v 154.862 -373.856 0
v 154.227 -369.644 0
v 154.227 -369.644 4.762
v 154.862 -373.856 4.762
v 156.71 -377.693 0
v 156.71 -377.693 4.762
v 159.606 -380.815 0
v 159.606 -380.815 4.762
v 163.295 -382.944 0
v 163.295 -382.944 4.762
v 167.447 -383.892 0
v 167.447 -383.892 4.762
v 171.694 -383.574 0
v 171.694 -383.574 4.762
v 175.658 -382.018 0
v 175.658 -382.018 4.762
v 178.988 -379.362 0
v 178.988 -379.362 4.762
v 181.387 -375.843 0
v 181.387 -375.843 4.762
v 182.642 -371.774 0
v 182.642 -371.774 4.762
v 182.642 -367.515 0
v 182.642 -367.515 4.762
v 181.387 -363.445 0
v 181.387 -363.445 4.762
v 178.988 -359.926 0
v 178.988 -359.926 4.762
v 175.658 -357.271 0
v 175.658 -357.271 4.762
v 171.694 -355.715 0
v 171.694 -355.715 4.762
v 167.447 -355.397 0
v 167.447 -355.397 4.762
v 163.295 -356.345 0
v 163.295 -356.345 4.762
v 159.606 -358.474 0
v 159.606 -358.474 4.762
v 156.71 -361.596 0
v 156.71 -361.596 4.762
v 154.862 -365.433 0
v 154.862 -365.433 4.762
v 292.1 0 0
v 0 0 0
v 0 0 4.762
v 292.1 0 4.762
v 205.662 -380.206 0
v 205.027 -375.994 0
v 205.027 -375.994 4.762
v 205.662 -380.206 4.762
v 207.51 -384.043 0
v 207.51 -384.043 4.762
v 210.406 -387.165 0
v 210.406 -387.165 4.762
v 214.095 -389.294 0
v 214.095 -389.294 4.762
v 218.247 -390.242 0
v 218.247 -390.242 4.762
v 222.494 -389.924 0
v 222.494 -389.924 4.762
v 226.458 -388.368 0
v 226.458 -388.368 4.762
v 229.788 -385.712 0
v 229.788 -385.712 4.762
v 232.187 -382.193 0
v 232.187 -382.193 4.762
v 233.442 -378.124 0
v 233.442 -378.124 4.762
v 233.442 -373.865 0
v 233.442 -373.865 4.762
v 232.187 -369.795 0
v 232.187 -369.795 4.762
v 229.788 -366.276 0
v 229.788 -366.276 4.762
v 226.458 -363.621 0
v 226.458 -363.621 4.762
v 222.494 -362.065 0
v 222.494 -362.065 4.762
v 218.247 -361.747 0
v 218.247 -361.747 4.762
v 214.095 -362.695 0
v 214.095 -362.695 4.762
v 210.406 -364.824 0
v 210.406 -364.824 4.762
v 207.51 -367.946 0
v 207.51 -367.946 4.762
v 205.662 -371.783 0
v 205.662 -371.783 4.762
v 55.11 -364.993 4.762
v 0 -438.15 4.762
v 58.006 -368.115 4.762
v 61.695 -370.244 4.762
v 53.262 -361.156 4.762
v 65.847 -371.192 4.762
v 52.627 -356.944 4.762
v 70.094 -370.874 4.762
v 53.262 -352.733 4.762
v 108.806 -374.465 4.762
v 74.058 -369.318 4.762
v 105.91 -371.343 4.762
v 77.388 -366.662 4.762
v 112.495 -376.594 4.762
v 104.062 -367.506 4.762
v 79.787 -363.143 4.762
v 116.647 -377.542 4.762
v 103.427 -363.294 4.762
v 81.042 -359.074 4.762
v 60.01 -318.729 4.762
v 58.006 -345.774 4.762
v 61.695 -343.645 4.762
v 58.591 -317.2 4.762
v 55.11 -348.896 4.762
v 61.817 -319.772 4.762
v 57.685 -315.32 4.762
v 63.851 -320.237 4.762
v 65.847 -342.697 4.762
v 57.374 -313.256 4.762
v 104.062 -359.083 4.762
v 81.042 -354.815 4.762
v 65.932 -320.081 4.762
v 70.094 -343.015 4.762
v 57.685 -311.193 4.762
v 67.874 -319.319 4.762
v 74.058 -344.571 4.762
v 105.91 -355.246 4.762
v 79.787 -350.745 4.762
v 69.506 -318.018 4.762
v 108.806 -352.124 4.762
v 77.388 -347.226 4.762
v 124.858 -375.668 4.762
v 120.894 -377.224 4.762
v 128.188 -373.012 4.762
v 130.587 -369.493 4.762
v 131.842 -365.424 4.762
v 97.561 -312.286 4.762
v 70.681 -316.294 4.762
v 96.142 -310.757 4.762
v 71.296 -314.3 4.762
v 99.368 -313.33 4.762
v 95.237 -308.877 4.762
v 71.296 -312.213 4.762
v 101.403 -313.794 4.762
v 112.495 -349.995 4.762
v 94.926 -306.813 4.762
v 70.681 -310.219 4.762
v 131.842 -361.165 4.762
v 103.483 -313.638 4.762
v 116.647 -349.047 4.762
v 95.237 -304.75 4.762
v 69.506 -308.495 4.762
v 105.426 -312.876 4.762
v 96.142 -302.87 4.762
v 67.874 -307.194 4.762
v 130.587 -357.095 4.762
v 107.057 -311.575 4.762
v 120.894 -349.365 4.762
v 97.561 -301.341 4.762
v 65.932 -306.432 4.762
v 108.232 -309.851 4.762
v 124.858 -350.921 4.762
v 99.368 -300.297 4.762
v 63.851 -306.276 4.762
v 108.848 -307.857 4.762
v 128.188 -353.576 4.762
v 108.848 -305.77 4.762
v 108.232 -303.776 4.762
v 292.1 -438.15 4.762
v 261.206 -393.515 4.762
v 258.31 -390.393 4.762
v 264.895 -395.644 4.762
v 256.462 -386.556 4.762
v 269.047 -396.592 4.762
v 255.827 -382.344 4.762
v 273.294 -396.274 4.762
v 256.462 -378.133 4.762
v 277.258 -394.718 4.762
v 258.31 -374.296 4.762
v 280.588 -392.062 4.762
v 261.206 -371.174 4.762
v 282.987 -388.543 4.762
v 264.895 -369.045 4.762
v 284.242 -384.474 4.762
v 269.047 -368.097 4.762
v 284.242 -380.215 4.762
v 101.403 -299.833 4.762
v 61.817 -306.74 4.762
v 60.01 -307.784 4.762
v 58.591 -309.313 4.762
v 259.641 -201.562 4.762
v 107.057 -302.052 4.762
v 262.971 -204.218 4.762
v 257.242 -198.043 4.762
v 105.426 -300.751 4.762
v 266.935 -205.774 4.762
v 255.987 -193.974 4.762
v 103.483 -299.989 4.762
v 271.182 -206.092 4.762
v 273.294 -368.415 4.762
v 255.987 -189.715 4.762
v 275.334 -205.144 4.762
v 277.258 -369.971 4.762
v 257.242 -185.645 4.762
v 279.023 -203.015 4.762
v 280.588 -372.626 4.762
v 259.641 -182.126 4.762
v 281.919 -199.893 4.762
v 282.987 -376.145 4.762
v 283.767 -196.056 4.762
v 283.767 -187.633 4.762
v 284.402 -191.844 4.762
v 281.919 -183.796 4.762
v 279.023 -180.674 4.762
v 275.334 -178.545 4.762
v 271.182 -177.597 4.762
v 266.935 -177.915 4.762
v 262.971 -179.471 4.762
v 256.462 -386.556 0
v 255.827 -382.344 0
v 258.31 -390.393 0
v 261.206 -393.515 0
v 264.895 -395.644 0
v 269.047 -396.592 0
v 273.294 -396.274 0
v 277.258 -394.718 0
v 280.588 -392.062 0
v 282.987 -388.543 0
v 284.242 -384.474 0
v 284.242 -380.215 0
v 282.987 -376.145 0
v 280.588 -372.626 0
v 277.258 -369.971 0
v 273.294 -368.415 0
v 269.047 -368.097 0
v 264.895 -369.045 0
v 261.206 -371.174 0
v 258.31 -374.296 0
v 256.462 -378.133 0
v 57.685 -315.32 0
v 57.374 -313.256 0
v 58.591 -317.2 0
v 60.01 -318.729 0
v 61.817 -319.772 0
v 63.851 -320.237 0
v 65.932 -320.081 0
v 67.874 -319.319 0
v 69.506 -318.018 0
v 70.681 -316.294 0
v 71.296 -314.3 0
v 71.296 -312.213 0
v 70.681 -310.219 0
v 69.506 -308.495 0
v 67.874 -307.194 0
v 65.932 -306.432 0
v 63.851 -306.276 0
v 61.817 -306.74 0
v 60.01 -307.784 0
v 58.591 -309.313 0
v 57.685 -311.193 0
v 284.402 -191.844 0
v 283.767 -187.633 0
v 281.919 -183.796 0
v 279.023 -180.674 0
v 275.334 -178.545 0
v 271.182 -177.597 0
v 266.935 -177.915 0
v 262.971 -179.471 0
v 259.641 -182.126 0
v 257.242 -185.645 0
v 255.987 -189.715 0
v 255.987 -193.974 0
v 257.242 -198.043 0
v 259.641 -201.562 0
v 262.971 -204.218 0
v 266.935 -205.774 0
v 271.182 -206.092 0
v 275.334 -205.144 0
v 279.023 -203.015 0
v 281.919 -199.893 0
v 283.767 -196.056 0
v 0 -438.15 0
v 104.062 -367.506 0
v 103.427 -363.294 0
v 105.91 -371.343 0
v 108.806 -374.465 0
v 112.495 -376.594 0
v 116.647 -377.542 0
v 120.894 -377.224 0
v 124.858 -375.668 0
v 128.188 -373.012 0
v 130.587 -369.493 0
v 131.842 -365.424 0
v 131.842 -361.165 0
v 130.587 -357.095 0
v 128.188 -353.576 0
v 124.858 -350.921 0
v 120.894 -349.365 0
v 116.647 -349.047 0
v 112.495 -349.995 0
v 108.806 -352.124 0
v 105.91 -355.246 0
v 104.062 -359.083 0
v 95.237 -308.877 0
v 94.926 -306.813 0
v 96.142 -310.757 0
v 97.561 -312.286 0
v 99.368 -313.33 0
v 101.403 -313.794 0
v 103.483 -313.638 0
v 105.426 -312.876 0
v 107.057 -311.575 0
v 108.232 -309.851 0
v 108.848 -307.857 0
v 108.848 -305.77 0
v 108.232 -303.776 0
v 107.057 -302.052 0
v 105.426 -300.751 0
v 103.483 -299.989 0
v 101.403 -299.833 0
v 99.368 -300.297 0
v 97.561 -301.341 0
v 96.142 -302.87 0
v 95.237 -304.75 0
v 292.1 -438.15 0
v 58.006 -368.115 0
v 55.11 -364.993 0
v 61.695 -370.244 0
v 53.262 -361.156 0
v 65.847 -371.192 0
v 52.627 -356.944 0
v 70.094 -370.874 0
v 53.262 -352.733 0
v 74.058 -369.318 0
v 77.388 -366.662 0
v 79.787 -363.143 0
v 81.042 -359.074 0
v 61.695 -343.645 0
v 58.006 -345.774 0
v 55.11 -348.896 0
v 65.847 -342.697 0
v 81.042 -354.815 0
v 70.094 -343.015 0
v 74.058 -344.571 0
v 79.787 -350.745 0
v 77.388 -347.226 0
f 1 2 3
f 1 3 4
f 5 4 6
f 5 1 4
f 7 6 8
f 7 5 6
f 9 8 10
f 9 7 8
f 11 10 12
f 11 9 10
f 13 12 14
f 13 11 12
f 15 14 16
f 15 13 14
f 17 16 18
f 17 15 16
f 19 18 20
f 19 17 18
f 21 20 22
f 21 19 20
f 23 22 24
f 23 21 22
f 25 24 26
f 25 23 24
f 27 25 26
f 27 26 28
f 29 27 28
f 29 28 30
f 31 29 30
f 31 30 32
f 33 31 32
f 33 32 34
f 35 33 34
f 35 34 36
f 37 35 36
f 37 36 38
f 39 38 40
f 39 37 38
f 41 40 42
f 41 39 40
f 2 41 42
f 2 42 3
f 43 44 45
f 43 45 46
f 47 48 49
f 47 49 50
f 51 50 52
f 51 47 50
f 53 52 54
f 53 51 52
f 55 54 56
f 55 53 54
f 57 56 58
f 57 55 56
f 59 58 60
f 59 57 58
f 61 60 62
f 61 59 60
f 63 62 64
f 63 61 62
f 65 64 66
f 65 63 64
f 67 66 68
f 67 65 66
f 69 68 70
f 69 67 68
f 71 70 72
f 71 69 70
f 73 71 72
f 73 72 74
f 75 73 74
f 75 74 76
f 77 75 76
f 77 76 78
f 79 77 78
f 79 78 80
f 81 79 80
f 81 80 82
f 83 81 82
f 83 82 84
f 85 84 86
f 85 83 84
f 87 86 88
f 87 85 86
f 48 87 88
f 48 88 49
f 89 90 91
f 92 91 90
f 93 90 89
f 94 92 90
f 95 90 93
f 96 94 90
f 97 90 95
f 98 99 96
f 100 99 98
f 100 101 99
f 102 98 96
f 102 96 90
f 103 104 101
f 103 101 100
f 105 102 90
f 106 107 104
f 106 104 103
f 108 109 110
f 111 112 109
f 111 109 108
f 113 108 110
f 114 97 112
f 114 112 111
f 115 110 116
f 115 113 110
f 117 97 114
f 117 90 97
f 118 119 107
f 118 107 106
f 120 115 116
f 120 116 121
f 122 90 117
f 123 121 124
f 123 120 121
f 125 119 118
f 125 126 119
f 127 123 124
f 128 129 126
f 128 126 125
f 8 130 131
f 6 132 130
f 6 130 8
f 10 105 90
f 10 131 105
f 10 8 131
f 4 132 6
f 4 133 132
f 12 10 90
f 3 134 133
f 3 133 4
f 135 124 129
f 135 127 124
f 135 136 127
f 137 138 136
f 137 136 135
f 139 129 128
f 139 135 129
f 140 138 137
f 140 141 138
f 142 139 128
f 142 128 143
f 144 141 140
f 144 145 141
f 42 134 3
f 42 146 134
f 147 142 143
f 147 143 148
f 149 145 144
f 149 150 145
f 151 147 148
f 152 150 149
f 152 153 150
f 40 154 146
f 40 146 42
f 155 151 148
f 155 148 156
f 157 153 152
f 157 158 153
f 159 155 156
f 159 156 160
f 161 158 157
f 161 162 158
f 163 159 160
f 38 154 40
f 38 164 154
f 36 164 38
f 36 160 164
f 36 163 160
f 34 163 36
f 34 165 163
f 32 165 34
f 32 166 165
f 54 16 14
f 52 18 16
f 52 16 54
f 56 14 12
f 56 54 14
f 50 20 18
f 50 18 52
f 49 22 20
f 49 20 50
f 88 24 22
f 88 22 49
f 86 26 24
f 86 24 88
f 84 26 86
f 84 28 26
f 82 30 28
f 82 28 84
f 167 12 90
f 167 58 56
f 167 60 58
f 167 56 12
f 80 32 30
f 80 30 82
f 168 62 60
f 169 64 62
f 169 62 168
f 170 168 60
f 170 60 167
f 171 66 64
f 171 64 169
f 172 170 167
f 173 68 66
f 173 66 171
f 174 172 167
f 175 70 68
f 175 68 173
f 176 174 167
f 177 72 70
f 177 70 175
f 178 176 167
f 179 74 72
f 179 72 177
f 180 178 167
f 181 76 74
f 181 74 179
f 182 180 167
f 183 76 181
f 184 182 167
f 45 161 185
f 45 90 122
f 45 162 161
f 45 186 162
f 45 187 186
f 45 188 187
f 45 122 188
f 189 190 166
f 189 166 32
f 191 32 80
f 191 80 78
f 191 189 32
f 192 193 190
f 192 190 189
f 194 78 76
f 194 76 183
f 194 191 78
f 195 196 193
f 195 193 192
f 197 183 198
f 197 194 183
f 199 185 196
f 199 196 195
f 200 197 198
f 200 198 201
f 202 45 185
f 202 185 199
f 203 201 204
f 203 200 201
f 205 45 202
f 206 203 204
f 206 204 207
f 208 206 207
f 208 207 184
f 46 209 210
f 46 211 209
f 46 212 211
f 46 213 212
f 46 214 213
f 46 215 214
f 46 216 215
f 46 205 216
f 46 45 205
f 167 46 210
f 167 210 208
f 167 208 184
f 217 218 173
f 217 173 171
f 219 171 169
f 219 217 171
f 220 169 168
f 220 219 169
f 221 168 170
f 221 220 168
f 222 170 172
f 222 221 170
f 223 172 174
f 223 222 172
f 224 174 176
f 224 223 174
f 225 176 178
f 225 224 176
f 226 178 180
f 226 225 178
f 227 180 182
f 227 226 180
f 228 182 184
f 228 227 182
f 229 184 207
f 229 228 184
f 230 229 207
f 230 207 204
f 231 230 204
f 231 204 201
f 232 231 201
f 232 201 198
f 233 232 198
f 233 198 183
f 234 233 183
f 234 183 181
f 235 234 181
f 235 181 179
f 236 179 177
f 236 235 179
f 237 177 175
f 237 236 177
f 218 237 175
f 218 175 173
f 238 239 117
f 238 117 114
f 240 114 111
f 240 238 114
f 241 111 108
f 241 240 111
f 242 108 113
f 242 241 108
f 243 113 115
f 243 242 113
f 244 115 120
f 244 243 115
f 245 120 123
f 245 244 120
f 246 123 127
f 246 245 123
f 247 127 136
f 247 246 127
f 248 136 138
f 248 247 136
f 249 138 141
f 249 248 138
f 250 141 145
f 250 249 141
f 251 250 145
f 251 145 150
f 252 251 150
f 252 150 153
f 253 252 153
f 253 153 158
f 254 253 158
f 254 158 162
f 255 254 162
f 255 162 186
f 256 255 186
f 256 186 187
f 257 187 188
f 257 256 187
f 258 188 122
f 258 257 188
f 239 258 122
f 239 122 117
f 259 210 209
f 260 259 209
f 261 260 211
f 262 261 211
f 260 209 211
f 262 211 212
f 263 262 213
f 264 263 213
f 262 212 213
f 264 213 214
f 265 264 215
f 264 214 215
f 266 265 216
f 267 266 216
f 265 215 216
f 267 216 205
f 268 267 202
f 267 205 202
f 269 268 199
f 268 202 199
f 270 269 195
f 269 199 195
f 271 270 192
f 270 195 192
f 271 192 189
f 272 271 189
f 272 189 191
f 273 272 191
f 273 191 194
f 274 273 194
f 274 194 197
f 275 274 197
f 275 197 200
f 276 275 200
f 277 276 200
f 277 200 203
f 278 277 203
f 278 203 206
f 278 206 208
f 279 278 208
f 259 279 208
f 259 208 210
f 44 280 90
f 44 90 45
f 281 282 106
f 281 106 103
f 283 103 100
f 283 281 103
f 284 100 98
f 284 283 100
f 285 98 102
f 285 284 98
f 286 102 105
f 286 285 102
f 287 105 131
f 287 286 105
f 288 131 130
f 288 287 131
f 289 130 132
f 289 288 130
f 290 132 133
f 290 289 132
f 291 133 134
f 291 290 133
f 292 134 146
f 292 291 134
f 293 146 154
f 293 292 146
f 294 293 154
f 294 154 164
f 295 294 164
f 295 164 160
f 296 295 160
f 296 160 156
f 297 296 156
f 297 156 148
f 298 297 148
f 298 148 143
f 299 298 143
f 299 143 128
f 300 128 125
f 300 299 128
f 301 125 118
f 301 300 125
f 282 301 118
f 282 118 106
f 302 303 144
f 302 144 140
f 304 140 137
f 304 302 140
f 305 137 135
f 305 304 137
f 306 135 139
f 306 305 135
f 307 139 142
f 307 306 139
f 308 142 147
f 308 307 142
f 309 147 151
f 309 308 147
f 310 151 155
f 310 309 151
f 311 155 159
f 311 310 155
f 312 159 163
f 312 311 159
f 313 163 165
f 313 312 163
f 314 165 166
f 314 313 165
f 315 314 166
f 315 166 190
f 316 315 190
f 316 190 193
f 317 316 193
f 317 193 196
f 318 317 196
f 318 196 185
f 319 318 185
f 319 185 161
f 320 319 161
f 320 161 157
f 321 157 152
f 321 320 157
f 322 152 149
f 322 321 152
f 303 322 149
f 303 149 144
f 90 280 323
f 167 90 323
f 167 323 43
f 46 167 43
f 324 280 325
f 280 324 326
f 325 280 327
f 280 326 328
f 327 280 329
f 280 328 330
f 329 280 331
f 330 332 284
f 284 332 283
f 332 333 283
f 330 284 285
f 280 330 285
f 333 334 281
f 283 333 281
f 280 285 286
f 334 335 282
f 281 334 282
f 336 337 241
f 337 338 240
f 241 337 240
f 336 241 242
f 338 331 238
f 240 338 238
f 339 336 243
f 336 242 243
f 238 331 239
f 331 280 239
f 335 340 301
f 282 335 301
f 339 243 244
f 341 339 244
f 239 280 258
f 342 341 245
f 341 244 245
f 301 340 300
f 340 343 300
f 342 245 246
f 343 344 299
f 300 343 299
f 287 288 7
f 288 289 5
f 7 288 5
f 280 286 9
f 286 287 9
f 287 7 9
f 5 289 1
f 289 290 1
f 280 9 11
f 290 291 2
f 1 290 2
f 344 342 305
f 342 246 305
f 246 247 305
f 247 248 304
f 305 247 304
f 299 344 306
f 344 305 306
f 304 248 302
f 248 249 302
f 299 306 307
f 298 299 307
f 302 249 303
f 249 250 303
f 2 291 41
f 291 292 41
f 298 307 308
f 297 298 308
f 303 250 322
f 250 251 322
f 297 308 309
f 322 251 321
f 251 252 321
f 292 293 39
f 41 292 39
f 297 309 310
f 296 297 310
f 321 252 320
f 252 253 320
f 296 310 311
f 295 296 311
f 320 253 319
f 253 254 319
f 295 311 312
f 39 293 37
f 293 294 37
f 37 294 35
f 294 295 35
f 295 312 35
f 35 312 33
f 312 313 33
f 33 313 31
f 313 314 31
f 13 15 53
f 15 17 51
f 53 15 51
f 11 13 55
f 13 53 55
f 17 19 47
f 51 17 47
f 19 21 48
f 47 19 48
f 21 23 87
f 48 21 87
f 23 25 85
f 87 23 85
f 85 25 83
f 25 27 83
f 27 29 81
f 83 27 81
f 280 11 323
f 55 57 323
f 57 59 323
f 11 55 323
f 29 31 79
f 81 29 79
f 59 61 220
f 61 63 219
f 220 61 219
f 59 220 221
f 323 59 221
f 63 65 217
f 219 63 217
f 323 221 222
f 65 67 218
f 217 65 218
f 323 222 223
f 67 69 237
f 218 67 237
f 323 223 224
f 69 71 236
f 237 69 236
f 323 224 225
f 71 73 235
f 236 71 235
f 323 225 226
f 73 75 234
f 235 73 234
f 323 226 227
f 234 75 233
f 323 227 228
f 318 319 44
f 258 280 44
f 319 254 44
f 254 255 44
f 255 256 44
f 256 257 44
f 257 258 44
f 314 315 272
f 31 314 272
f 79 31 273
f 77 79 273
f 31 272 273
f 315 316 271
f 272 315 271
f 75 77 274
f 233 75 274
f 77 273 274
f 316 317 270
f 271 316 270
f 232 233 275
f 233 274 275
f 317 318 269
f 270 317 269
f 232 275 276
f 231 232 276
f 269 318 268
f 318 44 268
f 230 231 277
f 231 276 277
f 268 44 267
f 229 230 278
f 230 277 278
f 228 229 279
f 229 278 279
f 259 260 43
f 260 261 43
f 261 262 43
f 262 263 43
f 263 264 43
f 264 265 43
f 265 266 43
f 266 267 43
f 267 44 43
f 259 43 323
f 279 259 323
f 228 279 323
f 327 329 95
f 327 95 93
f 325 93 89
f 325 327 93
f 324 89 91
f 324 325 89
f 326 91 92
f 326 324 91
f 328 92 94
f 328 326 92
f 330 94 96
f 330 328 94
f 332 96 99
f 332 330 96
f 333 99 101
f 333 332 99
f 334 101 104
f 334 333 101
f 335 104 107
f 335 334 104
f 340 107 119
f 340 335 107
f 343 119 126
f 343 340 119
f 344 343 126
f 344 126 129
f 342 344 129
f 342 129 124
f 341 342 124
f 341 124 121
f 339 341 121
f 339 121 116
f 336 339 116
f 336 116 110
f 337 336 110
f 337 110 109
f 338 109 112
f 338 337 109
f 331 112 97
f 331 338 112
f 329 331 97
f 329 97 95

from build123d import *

# Parameters (mm, degrees)
SKETCH1_W           = 292.1
SKETCH1_H           = 438.15
SKETCH1_R           = 7
SKETCH1_R_2         = 14.2875
BOSS_EXTRUDE1_DEPTH = 4.7625
SKETCH2_R           = 14.2875
CUT_EXTRUDE3_DEPTH  = 10.668


with BuildPart() as part:
    # Sketch1 → Boss-Extrude1 (new body)
    with BuildSketch(Plane.XY):
        with Locations((146.05, -219.075)):
            Rectangle(SKETCH1_W, SKETCH1_H)
        with Locations(Location((101.925695163, -306.813385495, 0), (0, 0, 180))):
            Circle(SKETCH1_R, mode=Mode.SUBTRACT)
        with Locations(Location((64.374426387, -313.256382727, 0), (0, 0, 180))):
            Circle(SKETCH1_R, mode=Mode.SUBTRACT)
        with Locations(Location((66.914426387, -356.944382727, 0), (0, 0, 180))):
            Circle(SKETCH1_R_2, mode=Mode.SUBTRACT)
        with Locations(Location((117.714426387, -363.294382727, 0), (0, 0, 180))):
            Circle(SKETCH1_R_2, mode=Mode.SUBTRACT)
        with Locations(Location((168.514426387, -369.644382727, 0), (0, 0, 180))):
            Circle(SKETCH1_R_2, mode=Mode.SUBTRACT)
        with Locations(Location((219.314426387, -375.994382727, 0), (0, 0, 180))):
            Circle(SKETCH1_R_2, mode=Mode.SUBTRACT)
        with Locations(Location((270.114426387, -382.344382727, 0), (0, 0, 180))):
            Circle(SKETCH1_R_2, mode=Mode.SUBTRACT)
    extrude(amount=BOSS_EXTRUDE1_DEPTH)

    # Sketch2 → Cut-Extrude3 (cut)
    with BuildSketch(Plane.XY.offset(4.7625)):
        with Locations((270.114426387, -191.844382727)):
            Circle(SKETCH2_R)
    extrude(amount=-CUT_EXTRUDE3_DEPTH, mode=Mode.SUBTRACT)


solid = part.part
